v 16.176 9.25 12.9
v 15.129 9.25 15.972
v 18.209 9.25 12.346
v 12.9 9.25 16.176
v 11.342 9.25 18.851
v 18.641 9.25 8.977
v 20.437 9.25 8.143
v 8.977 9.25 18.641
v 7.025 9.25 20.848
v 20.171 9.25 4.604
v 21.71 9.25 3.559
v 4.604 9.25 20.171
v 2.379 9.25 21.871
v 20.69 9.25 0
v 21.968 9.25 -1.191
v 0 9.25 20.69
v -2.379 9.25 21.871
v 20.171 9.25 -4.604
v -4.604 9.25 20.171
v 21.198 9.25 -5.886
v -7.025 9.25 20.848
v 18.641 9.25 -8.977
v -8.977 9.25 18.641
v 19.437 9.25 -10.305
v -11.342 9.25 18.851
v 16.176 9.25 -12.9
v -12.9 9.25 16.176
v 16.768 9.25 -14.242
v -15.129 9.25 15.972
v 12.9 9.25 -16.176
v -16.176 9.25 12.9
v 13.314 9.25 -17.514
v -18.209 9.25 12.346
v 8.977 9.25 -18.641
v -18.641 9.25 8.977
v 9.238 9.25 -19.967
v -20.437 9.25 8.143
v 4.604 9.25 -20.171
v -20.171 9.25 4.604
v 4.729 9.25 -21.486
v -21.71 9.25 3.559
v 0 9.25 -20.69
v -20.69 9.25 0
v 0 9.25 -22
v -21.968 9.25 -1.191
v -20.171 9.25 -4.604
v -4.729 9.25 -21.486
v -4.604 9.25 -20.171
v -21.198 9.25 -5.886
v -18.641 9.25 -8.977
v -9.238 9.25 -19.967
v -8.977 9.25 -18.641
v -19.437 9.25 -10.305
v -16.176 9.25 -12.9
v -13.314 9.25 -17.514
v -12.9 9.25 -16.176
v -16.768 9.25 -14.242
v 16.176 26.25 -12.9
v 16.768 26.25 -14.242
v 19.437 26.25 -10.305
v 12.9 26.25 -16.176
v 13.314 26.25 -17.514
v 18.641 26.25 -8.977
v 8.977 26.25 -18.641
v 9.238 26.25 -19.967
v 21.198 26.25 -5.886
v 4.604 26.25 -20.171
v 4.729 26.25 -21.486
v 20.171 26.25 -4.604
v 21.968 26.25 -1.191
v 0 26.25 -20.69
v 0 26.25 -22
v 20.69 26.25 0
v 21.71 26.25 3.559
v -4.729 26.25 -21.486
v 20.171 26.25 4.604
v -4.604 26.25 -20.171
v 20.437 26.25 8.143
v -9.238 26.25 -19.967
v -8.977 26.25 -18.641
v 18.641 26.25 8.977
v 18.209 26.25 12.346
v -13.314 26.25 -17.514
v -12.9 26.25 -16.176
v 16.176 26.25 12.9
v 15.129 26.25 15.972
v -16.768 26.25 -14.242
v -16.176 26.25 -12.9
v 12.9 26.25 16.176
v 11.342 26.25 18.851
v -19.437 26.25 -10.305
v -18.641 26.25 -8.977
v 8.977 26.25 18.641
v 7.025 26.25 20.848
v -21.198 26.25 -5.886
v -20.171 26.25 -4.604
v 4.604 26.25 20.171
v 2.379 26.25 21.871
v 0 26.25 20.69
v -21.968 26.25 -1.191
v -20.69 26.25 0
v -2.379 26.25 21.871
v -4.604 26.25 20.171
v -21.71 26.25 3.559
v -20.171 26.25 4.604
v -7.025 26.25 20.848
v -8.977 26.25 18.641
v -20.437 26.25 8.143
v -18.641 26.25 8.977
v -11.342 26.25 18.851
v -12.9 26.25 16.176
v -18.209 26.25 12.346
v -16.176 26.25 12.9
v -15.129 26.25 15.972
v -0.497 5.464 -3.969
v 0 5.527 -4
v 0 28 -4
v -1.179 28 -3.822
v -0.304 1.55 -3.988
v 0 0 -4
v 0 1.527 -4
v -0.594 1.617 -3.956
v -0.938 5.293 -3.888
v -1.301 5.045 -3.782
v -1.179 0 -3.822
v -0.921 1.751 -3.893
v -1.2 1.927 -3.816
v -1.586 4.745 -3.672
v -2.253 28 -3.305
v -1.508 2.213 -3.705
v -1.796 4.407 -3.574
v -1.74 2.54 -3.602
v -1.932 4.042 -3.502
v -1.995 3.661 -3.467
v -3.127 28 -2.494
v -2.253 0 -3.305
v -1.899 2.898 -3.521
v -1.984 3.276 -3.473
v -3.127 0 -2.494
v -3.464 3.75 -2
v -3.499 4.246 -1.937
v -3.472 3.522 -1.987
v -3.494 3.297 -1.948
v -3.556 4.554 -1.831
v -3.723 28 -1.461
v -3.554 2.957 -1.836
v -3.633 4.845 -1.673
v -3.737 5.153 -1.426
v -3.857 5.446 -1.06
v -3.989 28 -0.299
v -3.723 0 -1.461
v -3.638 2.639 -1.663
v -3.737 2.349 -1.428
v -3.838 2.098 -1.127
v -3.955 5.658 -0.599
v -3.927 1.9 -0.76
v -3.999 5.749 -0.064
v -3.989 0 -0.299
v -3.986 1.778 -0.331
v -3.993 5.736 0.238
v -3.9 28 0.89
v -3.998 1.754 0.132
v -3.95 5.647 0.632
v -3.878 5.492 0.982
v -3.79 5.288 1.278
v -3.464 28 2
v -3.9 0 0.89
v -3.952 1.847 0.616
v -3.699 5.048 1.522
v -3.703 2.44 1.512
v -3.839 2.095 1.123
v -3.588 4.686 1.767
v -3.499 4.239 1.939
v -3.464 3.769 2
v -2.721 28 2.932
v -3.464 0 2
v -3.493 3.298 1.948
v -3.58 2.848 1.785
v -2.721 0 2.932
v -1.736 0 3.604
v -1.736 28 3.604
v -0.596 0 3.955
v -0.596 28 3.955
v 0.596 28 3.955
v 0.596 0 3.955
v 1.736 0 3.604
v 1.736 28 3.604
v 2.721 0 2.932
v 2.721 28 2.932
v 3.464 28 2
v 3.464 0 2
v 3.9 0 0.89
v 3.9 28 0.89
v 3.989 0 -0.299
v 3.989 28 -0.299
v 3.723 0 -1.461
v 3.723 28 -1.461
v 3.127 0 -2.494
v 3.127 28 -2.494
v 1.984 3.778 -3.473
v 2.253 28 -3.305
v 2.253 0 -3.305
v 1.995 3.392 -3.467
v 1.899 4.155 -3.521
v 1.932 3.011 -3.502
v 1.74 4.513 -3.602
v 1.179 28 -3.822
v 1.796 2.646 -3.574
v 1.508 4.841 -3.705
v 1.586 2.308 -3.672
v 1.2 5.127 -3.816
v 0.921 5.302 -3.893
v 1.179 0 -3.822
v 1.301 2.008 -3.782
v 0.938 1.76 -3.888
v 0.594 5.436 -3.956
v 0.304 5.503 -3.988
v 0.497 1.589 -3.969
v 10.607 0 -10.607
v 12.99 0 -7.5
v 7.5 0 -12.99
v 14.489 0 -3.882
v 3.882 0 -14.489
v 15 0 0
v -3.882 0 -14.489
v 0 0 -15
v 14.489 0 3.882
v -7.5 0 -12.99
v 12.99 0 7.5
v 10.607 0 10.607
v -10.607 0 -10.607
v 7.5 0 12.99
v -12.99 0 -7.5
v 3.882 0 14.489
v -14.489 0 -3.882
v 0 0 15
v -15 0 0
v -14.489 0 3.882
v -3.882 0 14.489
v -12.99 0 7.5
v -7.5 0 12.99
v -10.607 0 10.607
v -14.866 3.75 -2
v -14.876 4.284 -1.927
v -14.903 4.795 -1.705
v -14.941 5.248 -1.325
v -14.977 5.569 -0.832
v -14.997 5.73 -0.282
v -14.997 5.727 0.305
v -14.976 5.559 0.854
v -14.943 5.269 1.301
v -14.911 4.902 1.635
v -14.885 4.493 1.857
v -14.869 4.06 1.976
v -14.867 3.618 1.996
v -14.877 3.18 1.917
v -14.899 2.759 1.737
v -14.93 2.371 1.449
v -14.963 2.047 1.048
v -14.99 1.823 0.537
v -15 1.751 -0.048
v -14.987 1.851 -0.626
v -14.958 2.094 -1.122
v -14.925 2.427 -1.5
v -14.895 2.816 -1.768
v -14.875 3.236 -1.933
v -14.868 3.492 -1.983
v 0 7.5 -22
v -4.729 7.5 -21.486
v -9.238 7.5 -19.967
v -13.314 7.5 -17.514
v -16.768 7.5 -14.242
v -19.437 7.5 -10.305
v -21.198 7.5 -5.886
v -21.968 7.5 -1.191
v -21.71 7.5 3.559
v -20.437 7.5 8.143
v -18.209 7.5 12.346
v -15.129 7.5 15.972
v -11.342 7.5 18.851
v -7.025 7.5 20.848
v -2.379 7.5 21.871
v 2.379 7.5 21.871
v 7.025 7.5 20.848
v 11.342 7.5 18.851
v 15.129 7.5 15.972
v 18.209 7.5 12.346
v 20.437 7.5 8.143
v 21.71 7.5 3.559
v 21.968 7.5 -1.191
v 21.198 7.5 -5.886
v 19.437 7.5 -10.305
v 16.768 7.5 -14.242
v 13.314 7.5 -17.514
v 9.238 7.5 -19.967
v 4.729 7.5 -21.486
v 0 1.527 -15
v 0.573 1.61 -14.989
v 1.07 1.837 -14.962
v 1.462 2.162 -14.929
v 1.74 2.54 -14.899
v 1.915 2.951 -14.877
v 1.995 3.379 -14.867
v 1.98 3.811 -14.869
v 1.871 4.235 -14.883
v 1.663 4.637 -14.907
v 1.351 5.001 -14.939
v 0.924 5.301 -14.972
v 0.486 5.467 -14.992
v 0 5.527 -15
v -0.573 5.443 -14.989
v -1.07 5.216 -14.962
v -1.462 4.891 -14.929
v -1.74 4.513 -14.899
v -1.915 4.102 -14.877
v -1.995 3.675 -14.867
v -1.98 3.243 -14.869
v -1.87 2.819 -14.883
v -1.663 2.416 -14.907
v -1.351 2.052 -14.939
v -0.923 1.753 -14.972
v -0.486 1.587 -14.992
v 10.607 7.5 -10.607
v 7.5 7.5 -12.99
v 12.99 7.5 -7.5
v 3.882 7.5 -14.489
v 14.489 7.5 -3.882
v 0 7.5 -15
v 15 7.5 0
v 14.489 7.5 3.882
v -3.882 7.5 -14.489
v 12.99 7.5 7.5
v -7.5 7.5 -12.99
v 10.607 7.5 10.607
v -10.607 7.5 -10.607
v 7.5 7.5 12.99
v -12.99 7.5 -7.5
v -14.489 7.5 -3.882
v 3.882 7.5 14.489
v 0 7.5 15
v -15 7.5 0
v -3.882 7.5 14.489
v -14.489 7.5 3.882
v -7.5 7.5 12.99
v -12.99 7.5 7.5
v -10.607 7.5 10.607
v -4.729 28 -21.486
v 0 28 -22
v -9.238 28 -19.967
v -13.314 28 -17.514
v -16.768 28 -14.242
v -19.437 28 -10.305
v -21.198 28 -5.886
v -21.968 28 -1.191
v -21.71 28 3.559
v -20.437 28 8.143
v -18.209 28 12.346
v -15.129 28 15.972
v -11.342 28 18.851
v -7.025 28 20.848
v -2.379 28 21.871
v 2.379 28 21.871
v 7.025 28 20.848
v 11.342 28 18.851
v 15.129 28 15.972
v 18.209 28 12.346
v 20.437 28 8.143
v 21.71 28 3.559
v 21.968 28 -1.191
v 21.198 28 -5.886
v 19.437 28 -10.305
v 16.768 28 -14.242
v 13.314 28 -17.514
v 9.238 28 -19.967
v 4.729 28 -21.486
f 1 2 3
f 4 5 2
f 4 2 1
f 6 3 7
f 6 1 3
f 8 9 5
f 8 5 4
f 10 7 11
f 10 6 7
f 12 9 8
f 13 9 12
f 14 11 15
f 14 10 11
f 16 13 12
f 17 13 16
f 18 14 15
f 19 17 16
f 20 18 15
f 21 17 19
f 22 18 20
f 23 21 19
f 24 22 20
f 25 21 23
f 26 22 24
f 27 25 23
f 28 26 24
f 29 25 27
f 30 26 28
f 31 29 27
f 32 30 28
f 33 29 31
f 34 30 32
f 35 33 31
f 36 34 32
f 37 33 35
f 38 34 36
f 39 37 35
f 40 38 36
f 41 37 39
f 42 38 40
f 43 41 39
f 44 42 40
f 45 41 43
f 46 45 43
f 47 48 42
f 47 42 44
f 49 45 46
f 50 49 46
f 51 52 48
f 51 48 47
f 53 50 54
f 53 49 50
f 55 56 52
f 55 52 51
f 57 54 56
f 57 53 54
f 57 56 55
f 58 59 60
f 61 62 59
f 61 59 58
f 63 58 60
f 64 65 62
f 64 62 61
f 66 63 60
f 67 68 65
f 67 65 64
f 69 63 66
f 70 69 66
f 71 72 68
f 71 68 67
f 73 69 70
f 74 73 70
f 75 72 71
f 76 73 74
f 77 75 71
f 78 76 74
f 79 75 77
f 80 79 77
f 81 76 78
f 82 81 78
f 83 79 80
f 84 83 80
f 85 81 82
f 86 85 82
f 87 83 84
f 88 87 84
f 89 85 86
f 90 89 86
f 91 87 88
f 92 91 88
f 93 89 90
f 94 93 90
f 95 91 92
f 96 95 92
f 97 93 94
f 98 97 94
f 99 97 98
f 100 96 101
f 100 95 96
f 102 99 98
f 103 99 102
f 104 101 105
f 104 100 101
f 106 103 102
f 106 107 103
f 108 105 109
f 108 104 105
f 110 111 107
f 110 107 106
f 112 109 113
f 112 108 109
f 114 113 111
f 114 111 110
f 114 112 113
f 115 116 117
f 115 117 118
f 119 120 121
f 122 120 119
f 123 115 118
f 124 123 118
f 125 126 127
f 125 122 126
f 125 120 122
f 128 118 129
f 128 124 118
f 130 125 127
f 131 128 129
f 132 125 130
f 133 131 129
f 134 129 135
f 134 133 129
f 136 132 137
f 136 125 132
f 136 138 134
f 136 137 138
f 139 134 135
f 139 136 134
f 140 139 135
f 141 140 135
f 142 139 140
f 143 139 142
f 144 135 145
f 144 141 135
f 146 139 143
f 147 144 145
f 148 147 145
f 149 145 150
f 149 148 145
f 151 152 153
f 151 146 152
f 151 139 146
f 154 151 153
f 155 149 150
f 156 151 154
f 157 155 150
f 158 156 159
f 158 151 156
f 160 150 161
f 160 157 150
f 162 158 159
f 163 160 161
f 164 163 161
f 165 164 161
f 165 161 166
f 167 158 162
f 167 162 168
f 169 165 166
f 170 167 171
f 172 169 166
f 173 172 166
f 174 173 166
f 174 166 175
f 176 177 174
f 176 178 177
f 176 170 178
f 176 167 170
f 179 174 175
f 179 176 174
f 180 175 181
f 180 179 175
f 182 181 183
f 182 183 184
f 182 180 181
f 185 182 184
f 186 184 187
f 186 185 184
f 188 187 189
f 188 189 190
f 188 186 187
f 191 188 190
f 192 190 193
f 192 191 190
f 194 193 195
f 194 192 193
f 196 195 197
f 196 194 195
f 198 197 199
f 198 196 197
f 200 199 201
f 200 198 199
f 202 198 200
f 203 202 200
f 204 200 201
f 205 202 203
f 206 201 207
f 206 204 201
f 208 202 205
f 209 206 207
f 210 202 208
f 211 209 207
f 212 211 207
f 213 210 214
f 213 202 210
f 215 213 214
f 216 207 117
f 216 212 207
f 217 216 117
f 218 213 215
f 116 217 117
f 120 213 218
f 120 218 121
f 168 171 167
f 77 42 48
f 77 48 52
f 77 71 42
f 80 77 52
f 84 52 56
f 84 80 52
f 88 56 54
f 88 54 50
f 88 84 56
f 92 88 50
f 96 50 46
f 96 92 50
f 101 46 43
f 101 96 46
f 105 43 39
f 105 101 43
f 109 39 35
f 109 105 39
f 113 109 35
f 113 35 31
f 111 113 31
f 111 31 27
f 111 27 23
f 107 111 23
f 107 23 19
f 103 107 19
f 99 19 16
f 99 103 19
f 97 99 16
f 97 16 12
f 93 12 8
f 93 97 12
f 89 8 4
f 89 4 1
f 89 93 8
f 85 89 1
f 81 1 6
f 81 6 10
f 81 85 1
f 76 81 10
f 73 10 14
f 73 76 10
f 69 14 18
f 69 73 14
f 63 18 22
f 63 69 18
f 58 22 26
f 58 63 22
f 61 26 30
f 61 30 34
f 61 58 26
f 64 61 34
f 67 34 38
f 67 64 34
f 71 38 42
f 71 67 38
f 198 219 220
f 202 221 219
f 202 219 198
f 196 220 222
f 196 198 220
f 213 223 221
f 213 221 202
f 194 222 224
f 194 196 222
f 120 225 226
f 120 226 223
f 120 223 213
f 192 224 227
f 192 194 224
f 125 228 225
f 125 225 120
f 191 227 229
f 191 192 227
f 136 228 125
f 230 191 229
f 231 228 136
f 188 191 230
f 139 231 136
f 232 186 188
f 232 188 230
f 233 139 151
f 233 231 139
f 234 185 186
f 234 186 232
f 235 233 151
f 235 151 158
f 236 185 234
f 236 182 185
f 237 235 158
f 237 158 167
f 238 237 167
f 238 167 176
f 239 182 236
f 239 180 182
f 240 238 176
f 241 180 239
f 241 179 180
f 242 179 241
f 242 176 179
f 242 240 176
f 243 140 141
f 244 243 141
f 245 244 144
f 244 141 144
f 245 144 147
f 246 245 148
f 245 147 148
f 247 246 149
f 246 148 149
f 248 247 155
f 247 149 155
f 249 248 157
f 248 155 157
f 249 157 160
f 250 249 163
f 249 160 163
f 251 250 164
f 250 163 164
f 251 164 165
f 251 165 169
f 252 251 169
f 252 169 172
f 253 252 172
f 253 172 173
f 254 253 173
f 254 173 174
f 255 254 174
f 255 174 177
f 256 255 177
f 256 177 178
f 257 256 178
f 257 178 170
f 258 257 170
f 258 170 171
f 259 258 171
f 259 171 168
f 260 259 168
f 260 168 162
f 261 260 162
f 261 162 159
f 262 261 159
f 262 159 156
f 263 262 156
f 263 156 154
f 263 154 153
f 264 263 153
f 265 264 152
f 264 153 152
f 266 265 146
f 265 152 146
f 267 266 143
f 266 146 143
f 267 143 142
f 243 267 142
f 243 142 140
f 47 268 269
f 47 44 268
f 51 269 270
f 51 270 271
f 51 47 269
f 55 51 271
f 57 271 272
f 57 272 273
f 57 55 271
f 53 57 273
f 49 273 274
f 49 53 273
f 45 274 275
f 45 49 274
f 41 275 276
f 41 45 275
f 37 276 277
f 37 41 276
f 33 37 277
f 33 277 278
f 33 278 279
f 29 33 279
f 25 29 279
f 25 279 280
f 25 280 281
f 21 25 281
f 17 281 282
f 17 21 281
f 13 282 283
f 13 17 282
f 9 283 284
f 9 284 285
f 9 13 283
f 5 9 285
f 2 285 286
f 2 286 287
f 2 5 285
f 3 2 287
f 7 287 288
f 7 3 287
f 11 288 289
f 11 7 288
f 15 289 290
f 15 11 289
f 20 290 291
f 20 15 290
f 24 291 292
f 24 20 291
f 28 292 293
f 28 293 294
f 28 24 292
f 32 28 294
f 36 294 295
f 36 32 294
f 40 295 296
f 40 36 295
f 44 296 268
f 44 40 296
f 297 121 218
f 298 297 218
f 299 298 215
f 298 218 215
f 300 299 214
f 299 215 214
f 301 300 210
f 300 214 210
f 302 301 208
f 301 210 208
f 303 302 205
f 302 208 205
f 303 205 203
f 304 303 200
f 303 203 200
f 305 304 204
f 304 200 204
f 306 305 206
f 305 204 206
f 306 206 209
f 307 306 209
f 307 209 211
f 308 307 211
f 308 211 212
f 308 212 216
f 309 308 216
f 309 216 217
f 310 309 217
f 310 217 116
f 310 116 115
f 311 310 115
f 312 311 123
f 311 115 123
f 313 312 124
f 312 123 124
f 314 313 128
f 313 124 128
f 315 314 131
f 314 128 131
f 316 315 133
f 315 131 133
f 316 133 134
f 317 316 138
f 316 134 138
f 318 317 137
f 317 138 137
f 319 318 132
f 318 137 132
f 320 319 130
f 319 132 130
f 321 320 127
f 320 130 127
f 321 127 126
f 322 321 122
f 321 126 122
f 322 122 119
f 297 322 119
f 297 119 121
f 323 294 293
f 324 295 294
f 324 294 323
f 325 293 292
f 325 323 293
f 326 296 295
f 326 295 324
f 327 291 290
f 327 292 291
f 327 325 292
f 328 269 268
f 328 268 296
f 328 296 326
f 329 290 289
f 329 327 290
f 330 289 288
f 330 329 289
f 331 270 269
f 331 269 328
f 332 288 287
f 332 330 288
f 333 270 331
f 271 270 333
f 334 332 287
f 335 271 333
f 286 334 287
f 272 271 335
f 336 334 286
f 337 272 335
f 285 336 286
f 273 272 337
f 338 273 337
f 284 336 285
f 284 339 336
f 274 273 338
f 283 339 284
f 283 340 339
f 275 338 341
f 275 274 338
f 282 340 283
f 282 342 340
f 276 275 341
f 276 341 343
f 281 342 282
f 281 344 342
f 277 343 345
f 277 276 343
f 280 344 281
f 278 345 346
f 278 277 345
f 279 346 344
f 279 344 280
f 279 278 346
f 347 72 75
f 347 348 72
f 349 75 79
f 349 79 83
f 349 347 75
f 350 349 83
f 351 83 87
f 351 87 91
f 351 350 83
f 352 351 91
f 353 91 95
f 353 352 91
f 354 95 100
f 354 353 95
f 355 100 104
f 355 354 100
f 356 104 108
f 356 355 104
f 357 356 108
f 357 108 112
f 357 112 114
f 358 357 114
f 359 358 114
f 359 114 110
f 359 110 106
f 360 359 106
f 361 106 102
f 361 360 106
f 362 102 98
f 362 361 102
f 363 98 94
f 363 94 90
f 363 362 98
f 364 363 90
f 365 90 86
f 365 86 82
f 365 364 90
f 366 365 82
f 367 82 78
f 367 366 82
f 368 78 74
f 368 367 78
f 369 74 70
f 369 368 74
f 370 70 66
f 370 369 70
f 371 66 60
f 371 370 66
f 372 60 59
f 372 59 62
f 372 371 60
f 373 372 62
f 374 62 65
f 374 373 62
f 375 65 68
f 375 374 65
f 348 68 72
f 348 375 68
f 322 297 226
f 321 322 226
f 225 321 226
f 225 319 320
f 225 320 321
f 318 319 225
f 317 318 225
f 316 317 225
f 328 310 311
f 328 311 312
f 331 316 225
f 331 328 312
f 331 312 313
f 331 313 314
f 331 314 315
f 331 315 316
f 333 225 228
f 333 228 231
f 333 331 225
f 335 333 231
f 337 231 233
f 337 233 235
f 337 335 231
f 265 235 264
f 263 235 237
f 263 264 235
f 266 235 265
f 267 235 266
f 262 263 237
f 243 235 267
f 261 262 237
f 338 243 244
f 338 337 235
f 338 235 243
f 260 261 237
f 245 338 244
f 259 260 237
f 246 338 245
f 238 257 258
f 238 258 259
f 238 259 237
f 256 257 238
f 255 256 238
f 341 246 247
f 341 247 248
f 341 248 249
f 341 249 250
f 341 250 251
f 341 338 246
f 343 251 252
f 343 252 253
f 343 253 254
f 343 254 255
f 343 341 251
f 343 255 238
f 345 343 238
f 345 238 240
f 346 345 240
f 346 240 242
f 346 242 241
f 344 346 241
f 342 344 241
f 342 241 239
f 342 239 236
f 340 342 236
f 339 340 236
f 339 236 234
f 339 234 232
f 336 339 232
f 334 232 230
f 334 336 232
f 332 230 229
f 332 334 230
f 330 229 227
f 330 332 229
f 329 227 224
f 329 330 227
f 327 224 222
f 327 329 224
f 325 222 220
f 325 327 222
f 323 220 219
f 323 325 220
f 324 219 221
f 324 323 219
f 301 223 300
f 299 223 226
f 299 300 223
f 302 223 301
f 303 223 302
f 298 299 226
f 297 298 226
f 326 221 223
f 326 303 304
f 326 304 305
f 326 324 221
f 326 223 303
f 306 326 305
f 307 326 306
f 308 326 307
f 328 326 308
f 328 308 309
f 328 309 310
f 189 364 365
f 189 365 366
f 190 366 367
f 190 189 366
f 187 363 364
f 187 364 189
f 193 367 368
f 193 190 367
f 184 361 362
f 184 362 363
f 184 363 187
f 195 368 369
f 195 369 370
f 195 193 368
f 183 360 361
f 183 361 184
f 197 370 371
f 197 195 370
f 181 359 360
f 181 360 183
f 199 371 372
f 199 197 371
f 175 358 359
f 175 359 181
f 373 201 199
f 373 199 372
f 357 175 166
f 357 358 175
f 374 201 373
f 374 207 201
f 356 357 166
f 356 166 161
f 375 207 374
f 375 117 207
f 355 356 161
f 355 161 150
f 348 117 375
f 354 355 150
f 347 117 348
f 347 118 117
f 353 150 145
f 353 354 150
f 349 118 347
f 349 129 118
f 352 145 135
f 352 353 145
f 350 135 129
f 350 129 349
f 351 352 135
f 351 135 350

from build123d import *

# Parameters (mm, degrees)
SKETCH5_R          = 2
CUT_EXTRUDE4_DEPTH = 18
SKETCH6_R          = 2
CUT_EXTRUDE5_DEPTH = 18


with BuildPart() as part:
    # Sketch1 → Revolve1 (revolve)
    with BuildSketch(Plane.XY, mode=Mode.PRIVATE) as revolve1_sk:
        Polygon((4, 0), (15, 0), (15, 7.5), (22, 7.5), (22, 9.25), (20.69, 9.25), (20.69, 26.25), (22, 26.25), (22, 28), (4, 28), align=None)
    revolve(revolve1_sk.sketch.rotate(Axis((0, 0, 0), (0, 1, 0)), 90), axis=Axis((0, 0, 0), (0, 1, 0)))

    # Sketch5 → Cut-Extrude4 (cut)
    with BuildSketch(Plane.XY):
        with Locations(Location((0, 3.526654559, 0), (0, 0, 270.000000001))):
            Circle(SKETCH5_R)
    extrude(amount=-CUT_EXTRUDE4_DEPTH, mode=Mode.SUBTRACT)

    # Sketch6 → Cut-Extrude5 (cut)
    with BuildSketch(Plane(origin=(0, 0, 0), x_dir=(0, 0, -1), z_dir=(1, 0, 0))):
        with Locations((0, 3.75)):
            Circle(SKETCH6_R)
    extrude(amount=-CUT_EXTRUDE5_DEPTH, mode=Mode.SUBTRACT)


solid = part.part
